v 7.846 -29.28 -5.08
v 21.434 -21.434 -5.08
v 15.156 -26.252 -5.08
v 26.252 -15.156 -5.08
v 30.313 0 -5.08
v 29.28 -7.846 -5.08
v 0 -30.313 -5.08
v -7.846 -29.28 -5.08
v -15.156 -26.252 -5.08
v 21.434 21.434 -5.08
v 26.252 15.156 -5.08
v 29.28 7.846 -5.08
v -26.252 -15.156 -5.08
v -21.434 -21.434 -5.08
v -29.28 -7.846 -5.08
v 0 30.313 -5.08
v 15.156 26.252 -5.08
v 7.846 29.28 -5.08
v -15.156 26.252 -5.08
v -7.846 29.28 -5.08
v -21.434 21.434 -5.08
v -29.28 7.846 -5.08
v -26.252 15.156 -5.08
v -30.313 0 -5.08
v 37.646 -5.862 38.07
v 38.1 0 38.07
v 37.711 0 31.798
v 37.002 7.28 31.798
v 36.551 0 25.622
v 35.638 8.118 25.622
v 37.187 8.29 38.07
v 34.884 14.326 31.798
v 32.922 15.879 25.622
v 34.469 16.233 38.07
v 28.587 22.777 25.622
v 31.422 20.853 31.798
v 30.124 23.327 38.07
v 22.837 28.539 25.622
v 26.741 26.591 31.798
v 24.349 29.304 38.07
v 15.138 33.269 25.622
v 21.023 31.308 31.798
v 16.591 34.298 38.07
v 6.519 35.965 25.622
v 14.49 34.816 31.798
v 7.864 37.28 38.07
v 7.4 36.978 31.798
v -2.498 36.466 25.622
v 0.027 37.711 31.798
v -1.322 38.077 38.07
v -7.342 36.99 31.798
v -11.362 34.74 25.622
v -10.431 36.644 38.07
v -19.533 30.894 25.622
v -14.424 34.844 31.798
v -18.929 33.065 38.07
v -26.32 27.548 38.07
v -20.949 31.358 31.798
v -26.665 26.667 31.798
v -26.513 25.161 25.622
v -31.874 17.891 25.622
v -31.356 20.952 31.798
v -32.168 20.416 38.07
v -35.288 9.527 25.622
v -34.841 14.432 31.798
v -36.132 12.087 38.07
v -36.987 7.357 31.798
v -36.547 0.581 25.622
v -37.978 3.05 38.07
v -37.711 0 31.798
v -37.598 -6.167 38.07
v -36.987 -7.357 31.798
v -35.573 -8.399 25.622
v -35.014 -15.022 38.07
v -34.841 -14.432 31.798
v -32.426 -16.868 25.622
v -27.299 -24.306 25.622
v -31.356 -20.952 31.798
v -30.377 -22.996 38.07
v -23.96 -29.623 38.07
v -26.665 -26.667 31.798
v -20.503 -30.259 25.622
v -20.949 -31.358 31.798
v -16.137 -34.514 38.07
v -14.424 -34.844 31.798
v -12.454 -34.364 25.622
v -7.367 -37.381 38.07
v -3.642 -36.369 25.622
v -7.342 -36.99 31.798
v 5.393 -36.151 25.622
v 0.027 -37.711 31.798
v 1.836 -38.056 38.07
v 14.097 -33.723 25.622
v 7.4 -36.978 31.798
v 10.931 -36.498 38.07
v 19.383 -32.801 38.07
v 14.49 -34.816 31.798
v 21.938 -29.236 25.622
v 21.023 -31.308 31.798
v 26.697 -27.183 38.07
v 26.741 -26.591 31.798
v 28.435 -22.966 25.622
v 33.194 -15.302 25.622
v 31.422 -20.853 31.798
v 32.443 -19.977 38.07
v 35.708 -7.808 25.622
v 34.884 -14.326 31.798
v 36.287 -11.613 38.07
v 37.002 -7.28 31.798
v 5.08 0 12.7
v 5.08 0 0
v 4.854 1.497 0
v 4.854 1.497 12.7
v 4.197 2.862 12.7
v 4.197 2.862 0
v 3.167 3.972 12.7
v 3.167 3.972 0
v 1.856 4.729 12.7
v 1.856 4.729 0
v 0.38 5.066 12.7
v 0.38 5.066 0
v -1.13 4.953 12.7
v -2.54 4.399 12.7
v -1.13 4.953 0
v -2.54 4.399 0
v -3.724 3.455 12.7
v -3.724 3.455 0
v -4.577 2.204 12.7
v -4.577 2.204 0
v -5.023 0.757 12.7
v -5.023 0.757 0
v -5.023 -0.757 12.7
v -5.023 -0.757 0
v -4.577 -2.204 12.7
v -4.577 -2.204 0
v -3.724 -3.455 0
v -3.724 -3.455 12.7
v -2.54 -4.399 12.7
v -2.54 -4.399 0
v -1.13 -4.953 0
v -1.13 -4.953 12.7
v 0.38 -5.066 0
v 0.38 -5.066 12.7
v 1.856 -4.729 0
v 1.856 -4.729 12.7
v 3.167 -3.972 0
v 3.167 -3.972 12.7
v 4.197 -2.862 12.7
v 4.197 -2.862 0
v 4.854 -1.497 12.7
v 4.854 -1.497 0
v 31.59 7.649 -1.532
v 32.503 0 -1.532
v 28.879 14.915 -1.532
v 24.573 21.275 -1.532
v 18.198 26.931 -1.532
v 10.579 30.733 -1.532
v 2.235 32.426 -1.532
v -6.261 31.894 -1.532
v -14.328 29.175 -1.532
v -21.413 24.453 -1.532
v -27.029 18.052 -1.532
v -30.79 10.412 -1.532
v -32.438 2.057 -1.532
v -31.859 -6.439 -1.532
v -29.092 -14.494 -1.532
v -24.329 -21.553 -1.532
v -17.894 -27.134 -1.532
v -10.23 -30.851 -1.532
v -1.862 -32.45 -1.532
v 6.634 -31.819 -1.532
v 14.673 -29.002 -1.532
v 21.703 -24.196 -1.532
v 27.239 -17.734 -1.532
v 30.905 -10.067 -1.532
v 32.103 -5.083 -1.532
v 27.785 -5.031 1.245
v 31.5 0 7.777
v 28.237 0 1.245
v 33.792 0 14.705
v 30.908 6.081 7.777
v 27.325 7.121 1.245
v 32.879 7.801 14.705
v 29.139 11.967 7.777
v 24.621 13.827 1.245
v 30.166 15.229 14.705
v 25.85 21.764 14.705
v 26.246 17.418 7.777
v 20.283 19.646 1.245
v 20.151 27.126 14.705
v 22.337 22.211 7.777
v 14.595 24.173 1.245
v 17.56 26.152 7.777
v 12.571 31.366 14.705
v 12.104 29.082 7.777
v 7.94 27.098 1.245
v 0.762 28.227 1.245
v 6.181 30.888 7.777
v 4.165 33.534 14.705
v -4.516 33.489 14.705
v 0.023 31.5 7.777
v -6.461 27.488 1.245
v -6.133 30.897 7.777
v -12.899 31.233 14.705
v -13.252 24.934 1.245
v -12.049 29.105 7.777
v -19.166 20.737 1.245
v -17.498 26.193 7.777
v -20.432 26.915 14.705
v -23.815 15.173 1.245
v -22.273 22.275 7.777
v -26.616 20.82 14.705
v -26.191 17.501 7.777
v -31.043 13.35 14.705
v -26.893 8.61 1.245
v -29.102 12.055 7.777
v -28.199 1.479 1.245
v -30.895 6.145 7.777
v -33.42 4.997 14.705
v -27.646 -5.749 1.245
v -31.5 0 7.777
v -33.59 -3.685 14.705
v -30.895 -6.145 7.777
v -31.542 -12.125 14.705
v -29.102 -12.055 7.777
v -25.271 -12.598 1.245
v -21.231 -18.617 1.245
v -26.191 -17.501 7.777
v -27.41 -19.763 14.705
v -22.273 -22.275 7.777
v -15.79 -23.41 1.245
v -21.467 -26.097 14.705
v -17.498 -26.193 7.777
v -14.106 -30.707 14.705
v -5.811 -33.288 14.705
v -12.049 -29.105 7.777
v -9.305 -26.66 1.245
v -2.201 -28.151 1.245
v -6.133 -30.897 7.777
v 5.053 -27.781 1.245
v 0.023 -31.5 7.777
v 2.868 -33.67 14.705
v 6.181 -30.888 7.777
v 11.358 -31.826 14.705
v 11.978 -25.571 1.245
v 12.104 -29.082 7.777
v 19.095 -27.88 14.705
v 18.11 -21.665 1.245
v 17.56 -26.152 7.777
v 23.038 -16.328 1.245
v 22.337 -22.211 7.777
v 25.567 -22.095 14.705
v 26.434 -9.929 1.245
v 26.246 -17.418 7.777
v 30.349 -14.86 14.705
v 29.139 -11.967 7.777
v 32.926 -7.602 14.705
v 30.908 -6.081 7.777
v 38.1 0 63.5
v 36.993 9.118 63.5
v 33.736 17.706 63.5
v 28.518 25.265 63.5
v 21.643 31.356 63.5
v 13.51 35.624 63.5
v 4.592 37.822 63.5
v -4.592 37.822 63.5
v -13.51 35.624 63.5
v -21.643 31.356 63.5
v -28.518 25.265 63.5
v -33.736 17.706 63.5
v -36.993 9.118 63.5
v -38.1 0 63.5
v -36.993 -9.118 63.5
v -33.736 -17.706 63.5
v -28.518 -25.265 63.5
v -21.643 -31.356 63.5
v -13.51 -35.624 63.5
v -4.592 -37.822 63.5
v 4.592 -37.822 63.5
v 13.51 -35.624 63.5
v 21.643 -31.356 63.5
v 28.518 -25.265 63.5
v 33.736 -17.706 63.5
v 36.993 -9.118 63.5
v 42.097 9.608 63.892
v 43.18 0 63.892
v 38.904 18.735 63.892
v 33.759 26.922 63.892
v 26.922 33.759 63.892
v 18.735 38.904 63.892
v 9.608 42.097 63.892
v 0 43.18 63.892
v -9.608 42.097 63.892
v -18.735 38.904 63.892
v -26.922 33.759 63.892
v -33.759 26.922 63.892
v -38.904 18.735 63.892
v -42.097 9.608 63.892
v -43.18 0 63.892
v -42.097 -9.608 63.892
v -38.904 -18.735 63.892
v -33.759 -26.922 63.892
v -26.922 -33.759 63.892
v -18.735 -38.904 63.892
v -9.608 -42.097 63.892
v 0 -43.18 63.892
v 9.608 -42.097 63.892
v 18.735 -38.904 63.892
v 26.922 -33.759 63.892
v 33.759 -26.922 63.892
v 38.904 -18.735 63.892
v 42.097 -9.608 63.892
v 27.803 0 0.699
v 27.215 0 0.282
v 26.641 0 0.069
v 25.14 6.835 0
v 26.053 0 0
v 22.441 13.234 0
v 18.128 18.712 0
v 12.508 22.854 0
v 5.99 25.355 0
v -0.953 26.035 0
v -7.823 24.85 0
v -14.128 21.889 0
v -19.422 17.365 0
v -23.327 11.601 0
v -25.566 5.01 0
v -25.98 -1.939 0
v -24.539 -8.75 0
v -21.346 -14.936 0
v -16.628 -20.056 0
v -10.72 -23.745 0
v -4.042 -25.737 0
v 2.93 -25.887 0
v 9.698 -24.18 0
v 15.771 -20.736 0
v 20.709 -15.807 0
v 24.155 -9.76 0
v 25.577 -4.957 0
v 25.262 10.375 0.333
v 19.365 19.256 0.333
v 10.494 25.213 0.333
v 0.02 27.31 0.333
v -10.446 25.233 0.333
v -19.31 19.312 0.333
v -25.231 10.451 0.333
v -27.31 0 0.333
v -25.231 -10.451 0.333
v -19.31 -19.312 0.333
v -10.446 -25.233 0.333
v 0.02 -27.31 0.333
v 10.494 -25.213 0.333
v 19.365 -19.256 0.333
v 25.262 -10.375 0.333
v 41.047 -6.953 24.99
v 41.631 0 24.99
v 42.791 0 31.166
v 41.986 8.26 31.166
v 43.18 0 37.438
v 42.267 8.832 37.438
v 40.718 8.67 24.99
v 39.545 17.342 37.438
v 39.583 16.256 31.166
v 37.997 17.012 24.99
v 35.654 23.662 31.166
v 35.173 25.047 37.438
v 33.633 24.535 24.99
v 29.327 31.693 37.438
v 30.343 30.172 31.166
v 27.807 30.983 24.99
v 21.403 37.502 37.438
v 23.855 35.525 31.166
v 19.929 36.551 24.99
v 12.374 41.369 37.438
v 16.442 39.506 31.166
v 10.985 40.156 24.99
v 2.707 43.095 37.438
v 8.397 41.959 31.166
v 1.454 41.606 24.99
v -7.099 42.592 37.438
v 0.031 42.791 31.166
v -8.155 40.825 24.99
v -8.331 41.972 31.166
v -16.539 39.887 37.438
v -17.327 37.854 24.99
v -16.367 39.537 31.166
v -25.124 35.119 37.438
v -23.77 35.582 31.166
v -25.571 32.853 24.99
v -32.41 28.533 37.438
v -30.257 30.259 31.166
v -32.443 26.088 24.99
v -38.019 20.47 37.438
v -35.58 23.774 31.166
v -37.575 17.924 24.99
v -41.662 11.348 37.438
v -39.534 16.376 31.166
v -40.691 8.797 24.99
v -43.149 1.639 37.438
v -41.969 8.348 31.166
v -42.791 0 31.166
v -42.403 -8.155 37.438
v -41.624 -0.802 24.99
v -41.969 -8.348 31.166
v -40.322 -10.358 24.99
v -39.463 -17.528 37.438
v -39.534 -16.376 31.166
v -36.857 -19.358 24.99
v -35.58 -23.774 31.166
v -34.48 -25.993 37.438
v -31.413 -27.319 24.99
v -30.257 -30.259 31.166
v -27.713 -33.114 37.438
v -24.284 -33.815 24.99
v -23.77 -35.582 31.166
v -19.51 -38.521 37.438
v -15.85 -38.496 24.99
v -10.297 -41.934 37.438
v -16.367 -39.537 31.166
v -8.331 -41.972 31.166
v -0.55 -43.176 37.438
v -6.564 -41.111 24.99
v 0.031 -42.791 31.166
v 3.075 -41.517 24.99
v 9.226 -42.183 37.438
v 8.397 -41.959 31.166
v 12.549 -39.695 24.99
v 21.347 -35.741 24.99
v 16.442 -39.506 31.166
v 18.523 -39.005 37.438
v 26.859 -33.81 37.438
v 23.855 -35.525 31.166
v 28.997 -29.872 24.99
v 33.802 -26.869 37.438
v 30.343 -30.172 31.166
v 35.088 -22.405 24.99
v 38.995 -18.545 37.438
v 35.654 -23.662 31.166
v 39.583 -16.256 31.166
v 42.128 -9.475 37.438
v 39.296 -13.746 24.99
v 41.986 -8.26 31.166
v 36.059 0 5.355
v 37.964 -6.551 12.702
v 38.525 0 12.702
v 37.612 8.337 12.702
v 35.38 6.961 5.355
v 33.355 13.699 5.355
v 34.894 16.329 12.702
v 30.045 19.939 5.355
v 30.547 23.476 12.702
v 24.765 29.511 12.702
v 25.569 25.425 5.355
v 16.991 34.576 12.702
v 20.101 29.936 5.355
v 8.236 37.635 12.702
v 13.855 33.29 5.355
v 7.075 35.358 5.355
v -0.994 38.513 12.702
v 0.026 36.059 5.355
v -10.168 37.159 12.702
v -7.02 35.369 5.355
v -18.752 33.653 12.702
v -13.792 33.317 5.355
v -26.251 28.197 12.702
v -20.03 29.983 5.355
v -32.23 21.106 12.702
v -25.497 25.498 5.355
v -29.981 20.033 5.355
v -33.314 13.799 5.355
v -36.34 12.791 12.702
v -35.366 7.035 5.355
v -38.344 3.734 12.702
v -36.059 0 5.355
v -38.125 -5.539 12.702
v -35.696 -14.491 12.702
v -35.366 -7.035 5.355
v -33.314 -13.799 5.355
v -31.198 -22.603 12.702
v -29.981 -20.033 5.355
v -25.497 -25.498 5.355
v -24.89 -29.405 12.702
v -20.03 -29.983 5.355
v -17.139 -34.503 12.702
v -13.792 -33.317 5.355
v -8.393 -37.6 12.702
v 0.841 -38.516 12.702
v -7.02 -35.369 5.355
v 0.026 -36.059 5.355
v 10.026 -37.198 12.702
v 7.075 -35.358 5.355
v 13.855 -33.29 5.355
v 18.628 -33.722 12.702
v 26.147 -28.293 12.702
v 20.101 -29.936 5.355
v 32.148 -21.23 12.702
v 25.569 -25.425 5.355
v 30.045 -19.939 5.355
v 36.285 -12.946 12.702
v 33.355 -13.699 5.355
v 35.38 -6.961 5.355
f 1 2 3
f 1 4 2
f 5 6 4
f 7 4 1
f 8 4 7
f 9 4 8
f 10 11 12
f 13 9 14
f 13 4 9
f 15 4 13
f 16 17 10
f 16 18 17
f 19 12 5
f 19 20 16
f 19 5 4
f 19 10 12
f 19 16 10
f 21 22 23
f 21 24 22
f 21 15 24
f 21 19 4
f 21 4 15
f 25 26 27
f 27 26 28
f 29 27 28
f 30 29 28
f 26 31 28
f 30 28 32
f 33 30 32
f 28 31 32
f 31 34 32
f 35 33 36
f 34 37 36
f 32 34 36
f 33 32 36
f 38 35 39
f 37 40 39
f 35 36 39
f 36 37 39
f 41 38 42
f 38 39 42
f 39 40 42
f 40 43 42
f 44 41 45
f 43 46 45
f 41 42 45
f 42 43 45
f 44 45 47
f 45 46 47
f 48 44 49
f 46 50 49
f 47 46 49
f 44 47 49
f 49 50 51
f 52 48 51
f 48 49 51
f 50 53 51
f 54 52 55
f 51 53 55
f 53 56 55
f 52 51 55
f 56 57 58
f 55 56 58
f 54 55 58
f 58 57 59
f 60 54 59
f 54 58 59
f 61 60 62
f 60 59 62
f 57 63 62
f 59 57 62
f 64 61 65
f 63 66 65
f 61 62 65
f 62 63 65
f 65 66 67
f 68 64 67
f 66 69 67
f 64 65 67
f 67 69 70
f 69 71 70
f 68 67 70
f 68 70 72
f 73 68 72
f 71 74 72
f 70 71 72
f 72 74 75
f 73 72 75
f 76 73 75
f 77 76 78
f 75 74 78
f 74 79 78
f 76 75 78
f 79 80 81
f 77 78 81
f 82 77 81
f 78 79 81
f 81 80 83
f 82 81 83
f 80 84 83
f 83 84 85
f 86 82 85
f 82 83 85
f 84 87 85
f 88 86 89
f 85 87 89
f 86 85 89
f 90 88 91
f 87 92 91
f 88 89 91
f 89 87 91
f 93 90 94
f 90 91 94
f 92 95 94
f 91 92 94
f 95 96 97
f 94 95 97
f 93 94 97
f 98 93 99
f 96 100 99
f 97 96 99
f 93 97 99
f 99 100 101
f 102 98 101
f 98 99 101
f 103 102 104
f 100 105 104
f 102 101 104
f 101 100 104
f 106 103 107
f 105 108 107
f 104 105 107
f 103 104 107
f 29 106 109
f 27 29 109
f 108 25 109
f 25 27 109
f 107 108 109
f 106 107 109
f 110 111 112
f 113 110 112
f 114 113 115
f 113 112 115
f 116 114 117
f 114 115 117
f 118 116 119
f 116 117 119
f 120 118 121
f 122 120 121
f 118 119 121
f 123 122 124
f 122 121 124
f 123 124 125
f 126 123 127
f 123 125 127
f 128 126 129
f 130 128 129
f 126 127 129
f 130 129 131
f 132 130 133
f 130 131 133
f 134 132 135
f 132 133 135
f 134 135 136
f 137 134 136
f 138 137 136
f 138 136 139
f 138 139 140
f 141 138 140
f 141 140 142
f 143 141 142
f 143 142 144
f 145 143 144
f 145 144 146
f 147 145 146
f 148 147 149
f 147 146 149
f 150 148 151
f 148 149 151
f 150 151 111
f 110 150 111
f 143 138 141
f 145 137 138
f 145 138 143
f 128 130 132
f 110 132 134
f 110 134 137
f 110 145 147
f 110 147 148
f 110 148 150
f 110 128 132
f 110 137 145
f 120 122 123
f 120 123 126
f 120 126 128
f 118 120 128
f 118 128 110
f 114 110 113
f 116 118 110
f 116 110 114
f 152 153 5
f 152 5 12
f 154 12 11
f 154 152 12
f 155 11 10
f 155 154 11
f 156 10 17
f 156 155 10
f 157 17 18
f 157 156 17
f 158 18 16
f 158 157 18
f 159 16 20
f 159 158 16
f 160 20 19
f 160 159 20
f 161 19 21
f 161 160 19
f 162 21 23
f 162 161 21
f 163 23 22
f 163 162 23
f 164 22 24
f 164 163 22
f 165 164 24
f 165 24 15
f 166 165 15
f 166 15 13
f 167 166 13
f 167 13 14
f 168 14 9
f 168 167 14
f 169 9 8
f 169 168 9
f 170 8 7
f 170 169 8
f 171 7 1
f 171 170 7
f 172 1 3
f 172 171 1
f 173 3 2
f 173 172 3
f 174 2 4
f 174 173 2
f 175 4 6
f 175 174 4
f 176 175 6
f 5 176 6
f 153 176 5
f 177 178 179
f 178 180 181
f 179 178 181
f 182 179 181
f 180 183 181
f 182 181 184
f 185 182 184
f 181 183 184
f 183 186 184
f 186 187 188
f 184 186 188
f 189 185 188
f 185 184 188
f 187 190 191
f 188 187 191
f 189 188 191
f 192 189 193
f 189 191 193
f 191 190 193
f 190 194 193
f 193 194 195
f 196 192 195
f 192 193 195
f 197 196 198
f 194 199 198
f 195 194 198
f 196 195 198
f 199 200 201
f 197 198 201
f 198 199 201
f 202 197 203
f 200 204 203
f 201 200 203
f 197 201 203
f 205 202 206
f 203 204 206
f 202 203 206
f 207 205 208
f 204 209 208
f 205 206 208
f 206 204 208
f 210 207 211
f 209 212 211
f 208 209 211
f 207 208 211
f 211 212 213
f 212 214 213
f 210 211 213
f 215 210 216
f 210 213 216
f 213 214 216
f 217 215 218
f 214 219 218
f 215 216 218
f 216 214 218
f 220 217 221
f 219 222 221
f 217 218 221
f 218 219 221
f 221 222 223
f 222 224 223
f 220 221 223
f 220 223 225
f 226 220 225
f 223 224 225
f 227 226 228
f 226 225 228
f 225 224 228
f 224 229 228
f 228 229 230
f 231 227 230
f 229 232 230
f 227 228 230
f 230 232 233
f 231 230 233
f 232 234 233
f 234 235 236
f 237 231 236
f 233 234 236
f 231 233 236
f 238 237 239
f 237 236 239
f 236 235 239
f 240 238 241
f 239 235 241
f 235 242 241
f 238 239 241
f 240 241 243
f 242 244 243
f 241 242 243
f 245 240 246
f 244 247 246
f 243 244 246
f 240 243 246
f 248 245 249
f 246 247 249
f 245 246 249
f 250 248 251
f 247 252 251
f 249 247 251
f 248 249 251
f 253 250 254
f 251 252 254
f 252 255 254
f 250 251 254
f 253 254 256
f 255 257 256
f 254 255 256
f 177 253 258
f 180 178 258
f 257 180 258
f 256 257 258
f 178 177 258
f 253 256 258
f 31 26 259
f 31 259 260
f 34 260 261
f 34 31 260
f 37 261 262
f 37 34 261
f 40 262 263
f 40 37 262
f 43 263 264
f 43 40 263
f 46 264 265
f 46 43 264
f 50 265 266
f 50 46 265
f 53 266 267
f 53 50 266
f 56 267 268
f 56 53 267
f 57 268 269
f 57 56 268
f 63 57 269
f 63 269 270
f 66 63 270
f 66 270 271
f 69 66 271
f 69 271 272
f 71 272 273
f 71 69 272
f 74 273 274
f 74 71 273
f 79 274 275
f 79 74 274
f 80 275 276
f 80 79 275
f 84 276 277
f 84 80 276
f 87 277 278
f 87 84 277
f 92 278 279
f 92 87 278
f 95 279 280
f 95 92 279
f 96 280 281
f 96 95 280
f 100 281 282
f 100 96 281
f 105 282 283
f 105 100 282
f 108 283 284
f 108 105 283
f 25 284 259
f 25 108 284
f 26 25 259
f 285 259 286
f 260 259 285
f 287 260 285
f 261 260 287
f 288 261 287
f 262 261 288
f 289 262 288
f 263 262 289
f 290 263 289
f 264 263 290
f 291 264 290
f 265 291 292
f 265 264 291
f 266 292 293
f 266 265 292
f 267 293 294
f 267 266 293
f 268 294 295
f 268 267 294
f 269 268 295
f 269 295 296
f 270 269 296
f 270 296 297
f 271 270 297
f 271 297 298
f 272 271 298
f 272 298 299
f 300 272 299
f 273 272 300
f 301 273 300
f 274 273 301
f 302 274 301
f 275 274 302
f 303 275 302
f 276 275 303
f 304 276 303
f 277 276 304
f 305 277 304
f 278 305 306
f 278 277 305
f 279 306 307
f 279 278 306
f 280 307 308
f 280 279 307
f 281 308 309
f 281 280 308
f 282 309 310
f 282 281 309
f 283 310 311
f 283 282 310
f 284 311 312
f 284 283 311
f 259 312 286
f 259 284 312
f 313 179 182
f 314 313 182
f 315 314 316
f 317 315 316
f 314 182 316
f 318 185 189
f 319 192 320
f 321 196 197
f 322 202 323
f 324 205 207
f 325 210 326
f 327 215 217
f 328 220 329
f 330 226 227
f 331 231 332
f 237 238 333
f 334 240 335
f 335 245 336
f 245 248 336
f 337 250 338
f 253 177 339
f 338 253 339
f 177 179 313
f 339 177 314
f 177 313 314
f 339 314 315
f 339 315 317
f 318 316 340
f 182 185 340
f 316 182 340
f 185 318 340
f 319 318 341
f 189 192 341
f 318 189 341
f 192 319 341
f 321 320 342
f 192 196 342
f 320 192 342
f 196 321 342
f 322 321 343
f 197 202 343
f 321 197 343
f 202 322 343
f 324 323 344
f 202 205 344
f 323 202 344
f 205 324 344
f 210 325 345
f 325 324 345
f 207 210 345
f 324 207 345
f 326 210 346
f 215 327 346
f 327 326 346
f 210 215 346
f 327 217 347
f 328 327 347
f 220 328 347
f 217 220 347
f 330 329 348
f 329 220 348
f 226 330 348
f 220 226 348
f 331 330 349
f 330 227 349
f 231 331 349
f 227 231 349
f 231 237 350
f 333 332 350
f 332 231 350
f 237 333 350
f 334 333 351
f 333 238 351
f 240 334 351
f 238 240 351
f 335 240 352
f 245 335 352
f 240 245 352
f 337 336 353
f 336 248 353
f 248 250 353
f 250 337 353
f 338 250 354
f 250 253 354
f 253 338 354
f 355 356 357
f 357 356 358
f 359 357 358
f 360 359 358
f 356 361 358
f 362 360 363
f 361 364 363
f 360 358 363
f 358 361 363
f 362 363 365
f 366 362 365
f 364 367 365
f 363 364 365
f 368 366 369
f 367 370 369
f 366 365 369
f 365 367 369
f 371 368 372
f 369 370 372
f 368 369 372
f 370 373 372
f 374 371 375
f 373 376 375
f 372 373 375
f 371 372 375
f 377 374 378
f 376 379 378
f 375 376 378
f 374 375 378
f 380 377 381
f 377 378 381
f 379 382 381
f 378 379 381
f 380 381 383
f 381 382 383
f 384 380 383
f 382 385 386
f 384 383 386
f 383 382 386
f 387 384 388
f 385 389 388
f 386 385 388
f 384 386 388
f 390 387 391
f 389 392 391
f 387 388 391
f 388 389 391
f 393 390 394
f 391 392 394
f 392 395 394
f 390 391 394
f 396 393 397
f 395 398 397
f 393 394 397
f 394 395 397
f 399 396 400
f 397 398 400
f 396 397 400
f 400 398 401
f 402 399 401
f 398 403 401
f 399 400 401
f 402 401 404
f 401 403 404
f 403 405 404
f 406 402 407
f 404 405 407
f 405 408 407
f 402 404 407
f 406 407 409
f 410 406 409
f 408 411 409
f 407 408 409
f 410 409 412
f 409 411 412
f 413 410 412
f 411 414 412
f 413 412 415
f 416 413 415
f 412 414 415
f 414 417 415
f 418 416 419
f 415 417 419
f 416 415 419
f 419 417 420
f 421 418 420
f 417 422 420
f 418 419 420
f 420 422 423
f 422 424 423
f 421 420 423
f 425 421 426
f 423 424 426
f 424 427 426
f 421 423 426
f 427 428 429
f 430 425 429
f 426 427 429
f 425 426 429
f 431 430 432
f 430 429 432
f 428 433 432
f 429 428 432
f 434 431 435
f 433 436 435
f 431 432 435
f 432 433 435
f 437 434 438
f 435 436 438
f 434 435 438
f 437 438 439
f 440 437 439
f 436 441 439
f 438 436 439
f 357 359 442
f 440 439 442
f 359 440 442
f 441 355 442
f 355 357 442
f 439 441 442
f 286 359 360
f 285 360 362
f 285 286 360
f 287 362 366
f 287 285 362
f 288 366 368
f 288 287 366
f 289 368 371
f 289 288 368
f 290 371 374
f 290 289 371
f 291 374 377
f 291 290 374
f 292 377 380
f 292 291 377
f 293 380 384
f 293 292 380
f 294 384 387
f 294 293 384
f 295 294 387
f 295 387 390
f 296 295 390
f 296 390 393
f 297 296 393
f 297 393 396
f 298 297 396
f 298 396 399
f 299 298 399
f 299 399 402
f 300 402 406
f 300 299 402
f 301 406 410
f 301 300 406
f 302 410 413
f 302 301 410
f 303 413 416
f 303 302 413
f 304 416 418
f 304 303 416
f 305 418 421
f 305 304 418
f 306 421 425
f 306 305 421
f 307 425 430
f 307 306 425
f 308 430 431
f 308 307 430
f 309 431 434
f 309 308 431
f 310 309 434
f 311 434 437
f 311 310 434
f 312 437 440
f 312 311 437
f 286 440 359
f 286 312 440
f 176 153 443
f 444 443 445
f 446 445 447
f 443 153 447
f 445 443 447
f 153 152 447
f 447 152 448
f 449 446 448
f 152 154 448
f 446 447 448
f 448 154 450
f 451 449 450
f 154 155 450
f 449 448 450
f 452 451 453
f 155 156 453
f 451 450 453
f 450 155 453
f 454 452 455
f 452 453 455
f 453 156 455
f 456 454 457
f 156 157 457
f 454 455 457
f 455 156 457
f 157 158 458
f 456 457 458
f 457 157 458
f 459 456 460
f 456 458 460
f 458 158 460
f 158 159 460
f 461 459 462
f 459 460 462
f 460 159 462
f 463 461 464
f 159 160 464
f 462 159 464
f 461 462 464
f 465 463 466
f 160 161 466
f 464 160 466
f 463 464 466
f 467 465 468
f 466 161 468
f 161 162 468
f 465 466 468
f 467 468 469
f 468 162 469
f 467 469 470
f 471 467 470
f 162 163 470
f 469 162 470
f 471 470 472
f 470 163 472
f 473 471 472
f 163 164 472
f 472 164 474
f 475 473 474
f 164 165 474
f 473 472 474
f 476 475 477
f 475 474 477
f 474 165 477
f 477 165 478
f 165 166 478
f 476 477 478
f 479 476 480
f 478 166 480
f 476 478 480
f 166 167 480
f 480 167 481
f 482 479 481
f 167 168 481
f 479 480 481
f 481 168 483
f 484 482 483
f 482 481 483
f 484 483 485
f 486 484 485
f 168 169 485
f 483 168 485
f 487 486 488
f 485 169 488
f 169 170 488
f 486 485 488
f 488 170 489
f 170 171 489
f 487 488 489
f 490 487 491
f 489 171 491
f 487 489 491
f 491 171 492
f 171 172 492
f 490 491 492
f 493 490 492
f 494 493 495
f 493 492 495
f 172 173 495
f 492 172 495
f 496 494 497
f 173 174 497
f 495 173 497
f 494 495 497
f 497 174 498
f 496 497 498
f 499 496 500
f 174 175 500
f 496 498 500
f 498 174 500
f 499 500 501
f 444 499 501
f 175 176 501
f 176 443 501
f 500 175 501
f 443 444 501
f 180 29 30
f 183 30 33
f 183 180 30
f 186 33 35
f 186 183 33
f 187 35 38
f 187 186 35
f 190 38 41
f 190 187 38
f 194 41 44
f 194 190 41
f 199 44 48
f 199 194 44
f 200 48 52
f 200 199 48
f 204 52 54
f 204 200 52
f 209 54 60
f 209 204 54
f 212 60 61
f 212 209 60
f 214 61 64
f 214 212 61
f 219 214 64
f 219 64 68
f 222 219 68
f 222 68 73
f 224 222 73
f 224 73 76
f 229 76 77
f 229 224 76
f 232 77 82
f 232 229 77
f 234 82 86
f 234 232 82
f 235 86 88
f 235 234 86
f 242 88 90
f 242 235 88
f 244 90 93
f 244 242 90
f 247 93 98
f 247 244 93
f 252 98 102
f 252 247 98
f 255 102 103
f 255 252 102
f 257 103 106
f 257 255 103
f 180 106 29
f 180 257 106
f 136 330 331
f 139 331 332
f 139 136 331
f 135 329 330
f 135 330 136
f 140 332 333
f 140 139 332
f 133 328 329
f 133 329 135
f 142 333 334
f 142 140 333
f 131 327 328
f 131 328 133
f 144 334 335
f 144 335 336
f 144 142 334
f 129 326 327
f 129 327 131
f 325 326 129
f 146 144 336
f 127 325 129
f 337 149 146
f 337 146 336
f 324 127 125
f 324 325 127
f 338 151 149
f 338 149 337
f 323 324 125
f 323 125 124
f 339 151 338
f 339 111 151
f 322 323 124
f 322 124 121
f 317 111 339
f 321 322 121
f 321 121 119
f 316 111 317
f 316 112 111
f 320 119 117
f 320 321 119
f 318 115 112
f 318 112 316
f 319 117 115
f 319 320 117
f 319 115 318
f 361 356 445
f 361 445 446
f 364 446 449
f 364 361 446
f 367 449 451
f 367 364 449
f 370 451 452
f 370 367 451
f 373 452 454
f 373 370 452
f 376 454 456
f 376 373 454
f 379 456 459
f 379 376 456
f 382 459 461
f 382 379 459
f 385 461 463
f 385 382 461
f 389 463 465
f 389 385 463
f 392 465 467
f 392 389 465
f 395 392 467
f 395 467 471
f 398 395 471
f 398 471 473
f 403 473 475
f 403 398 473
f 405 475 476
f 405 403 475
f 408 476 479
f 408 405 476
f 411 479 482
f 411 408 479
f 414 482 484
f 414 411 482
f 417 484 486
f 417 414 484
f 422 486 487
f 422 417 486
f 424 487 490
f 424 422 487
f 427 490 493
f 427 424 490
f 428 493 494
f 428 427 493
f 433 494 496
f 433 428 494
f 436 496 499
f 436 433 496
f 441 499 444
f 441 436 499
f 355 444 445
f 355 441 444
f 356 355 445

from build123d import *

# Parameters (mm, degrees)
F2_R     = 50.8
F3_R     = 50.8
F4_R     = 2.54
F5_R     = 5.08
F6_DEPTH = 12.7


with BuildPart() as f1:
    # F0 (on Front) → F1 (revolve)
    with BuildSketch(Plane.XZ):
        Polygon((43.18, 63.892171), (38.1, 63.5), (38.1, 31.75), (31.875944, 7.124381), (27.478636, 0), (0, 0), (0, -5.08), (30.312885, -5.08), (36.60948, 5.121546), (43.18, 31.11796), align=None)
    revolve(axis=Axis((0, 0, 31.75), (0, 0, 1)))

    # F2
    f2_edges = [f1.edges().sort_by_distance(p)[0] for p in [
        (-43.18, 0, 31.11796),
        (-36.60948, 0, 5.121546),
    ]]
    fillet(f2_edges, radius=F2_R)

    # F3
    f3_edges = [f1.edges().sort_by_distance(p)[0] for p in [
        (-38.1, 0, 31.75),
        (-31.875944, 0, 7.124381),
    ]]
    fillet(f3_edges, radius=F3_R)

    # F4
    f4_edges = [f1.edges().sort_by_distance(p)[0] for p in [
        (-27.478636, 0, 0),
    ]]
    fillet(f4_edges, radius=F4_R)

    # F5 (on face) → F6 (join)
    with BuildSketch(Plane.XY):
        Circle(F5_R)
    extrude(amount=F6_DEPTH)


solid = f1.part
